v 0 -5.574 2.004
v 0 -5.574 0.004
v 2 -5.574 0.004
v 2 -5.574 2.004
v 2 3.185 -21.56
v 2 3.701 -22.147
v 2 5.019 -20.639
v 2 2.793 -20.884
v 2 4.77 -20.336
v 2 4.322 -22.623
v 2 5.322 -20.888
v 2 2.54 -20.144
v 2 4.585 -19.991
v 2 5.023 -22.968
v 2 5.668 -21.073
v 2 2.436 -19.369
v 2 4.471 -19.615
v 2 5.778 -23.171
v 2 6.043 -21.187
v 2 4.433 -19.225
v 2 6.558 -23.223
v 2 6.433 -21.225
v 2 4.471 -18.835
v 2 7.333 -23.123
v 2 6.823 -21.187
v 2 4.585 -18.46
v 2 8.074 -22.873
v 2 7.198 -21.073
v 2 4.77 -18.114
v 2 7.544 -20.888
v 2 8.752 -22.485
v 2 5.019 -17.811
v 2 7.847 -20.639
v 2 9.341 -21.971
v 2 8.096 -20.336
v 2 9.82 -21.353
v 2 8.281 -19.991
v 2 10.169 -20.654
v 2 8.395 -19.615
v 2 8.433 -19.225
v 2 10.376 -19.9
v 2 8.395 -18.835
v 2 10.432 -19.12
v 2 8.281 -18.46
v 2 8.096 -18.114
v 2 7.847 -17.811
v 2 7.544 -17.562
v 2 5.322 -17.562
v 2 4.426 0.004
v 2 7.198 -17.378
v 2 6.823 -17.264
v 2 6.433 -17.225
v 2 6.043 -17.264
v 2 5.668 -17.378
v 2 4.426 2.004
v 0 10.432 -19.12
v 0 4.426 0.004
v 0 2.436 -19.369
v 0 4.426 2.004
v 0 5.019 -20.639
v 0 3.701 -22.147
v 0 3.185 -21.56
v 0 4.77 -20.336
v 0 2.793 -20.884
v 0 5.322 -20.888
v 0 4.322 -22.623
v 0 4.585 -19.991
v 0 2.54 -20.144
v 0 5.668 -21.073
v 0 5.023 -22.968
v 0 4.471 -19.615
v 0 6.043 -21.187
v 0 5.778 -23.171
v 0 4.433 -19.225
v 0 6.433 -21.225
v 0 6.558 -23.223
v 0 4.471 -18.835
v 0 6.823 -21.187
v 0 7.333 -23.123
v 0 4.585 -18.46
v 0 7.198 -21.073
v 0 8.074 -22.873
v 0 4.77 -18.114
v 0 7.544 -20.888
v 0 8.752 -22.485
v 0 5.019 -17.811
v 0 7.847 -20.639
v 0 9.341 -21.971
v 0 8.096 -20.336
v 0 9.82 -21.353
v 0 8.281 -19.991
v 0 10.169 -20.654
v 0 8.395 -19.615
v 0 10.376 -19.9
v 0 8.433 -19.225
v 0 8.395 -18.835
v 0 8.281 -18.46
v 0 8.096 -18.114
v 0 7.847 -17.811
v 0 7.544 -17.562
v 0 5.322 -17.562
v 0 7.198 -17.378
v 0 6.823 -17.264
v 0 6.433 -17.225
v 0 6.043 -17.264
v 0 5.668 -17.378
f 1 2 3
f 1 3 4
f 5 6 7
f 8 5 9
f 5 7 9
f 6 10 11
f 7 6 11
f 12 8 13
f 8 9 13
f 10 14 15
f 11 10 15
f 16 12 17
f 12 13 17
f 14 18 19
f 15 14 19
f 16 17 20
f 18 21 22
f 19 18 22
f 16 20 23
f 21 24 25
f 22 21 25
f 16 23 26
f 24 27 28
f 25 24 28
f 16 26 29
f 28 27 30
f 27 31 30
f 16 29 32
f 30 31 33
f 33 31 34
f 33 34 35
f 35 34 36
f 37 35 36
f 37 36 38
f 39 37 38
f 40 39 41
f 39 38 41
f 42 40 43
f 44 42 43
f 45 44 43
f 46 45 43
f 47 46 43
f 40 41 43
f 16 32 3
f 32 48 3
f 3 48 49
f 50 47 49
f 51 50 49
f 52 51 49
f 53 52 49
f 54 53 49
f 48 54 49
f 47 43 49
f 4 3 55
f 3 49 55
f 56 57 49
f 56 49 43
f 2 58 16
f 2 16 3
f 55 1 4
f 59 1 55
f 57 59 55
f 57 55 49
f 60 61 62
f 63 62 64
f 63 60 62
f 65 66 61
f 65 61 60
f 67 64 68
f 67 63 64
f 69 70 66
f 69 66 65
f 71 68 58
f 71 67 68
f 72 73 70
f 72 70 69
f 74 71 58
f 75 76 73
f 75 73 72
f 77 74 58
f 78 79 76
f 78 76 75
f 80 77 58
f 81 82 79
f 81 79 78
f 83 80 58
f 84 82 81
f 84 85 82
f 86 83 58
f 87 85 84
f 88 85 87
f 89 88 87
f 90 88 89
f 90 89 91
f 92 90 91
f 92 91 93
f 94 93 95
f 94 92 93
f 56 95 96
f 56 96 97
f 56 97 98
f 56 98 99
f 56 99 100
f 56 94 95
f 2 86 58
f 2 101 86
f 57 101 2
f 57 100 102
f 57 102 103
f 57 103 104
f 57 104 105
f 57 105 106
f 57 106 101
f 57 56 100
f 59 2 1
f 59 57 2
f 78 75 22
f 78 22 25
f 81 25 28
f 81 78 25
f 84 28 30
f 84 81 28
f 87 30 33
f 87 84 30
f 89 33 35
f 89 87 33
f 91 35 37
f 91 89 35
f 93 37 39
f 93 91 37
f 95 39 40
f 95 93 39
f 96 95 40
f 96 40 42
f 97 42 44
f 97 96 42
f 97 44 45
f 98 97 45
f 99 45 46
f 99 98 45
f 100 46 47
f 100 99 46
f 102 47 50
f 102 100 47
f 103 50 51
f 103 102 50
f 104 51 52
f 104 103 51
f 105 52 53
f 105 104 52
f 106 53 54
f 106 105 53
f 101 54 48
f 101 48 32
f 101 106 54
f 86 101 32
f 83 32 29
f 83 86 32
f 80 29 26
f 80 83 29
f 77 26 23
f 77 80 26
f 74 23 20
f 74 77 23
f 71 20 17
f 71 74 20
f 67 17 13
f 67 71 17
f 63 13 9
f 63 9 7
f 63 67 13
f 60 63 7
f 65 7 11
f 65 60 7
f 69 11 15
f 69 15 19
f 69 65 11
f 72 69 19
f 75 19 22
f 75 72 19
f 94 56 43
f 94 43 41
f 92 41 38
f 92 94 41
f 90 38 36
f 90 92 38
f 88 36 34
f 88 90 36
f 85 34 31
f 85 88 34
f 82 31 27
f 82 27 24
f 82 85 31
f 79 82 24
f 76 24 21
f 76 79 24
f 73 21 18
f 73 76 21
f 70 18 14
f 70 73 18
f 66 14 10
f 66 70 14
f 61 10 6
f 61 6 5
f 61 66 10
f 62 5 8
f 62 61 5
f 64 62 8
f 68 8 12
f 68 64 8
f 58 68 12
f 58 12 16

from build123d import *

# Parameters (mm, degrees)
SKETCH1_R           = 2
BOSS_EXTRUDE1_DEPTH = 2


with BuildPart() as part:
    # Sketch1 → Boss-Extrude1 (new body)
    with BuildSketch(Plane(origin=(0, 0, 0), x_dir=(0, 0, -1), z_dir=(1, 0, 0))):
        with BuildLine():
            Line((-0.003608009, 4.426390949), (19.120298853, 10.431566954))
            ThreePointArc((19.120298853, 10.431566954), (23.223332093, 6.557543739), (19.369494044, 2.435545445))
            Line((19.369494044, 2.435545445), (-0.003608009, -5.573609051))
            Line((-0.003608009, -5.573609051), (-2.003608009, -5.573609051))
            Line((-2.003608009, -5.573609051), (-2.003608009, 4.426390949))
            Line((-2.003608009, 4.426390949), (-0.003608009, 4.426390949))
        make_face()
        with Locations((19.225273181, 6.432944643)):
            Circle(SKETCH1_R, mode=Mode.SUBTRACT)
    extrude(amount=BOSS_EXTRUDE1_DEPTH)


solid = part.part
